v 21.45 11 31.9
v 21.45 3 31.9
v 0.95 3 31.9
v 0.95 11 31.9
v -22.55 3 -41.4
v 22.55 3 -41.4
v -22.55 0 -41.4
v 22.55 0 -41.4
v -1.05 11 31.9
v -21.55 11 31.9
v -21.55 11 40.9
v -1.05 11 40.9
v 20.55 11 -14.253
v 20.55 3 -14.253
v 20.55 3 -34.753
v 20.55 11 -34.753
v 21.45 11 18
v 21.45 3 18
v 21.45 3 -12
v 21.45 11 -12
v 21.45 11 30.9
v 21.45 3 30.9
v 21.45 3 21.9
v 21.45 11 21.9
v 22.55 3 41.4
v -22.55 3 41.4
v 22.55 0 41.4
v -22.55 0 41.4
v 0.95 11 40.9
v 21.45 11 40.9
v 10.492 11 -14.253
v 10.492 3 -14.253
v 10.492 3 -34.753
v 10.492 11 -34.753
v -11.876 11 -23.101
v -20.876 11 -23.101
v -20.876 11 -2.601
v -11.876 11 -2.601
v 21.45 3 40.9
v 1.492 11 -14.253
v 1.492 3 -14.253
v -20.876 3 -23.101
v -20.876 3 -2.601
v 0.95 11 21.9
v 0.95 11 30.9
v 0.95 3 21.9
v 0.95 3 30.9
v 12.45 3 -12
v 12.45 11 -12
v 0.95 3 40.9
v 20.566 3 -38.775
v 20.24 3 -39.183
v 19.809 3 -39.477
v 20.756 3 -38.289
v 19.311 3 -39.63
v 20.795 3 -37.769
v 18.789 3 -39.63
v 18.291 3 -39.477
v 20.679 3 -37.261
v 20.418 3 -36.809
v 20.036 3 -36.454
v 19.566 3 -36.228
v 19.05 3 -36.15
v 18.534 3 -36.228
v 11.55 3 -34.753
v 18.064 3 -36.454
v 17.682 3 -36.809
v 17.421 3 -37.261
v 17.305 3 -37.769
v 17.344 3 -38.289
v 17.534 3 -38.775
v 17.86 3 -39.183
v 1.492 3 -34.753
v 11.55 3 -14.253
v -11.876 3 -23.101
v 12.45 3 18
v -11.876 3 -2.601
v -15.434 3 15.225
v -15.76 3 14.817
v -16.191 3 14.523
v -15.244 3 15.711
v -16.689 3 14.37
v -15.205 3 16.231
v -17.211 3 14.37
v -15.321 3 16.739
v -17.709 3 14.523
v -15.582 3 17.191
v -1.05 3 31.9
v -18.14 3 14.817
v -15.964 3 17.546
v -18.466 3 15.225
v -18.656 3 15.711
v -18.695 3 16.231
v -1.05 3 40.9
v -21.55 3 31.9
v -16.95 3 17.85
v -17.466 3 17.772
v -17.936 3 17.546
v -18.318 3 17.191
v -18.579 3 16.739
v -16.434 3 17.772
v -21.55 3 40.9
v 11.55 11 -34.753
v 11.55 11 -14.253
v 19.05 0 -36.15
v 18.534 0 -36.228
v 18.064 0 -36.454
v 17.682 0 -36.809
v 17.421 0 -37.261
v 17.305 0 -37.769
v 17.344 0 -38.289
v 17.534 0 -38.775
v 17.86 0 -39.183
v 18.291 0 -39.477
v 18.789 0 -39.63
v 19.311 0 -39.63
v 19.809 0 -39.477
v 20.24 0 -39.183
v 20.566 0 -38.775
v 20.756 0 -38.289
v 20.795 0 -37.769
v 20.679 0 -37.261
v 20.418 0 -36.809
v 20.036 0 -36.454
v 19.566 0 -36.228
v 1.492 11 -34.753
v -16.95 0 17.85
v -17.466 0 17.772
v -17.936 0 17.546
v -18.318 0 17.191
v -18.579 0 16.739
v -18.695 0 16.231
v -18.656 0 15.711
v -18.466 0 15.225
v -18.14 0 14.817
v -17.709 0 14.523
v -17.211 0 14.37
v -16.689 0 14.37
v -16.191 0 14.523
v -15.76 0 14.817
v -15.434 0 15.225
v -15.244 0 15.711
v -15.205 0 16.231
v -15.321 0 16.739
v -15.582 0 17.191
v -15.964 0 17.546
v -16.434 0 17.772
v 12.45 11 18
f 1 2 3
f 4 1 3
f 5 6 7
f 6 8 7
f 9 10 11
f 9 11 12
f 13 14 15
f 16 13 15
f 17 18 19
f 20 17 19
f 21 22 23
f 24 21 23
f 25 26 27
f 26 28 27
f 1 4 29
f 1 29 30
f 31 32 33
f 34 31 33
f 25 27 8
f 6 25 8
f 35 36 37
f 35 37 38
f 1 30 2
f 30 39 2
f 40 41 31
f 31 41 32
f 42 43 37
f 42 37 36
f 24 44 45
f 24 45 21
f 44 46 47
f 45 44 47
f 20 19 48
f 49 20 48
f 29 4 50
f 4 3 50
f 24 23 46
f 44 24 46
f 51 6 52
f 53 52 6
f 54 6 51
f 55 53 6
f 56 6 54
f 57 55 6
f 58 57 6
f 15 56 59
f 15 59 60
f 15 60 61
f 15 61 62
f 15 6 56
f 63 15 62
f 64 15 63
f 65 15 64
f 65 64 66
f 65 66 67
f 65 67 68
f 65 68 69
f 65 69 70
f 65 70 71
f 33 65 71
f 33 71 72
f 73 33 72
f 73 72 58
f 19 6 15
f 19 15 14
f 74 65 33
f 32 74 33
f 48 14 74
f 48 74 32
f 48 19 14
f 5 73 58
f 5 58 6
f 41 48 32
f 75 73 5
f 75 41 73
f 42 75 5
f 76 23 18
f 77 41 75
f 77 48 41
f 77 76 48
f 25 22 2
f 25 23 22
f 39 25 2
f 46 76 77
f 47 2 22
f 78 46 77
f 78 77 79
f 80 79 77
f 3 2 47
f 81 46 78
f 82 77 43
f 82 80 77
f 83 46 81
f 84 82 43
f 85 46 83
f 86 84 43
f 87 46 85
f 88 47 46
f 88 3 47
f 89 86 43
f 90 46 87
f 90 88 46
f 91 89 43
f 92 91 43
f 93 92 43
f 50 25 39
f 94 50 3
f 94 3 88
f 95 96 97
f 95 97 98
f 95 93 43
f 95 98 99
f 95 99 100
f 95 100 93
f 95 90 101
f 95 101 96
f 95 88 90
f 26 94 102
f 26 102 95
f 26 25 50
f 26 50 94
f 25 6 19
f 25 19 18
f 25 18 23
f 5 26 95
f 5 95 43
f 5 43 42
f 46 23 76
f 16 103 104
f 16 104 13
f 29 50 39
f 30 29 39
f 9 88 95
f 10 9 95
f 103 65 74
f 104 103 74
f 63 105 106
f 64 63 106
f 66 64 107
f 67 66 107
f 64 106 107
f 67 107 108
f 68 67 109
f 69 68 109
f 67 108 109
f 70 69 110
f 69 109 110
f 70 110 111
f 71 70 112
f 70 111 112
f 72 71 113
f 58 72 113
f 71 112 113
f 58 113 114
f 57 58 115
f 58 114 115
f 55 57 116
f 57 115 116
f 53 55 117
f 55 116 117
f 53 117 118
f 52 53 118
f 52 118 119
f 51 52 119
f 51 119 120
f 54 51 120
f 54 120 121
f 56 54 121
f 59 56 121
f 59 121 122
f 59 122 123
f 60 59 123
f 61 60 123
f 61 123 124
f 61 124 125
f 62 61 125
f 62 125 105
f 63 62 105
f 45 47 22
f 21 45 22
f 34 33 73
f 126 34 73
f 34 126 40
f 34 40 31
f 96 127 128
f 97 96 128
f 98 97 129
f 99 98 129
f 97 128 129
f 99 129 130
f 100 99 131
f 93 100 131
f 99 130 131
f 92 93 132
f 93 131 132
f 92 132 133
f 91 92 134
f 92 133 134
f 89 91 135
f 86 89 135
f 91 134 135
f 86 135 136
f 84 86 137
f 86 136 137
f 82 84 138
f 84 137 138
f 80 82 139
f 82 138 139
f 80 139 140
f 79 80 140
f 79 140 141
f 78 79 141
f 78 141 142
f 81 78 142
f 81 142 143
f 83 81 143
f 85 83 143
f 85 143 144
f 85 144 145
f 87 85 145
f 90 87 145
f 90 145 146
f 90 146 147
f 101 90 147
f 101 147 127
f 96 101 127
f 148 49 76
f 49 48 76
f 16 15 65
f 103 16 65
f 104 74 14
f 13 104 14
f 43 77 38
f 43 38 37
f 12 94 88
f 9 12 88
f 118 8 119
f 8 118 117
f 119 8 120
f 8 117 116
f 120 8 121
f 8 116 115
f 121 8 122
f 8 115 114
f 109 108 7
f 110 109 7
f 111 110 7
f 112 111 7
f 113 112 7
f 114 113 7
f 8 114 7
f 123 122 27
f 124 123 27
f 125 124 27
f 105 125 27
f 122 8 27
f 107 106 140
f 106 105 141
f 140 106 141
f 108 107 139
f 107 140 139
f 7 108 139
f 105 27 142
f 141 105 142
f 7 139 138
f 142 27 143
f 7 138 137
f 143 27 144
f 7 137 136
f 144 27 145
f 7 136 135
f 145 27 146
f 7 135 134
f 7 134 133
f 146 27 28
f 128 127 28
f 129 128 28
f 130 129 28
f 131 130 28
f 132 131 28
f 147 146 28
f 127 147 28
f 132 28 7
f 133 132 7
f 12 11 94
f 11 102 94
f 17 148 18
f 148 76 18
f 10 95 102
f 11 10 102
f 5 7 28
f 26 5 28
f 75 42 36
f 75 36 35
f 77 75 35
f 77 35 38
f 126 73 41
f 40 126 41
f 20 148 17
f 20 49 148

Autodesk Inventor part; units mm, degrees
ref_plane "YZ Plane" through (0, 0, 0) normal (1, 0, 0) x (0, 1, 0)
ref_plane "XZ Plane" through (0, 0, 0) normal (0, 1, 0) x (-1, 0, 0)
ref_plane "XY Plane" through (0, 0, 0) normal (0, 0, 1) x (1, 0, 0)
sketch "Szkic1" plane through (0, 0, 0) normal (0, 1, 0) x (-1, 0, 0)
  line L0 (-22.55, -41.4) -> (22.55, -41.4)
  line L1 (22.55, -41.4) -> (22.55, 41.4)
  line L2 (22.55, 41.4) -> (-22.55, 41.4)
  line L3 (-22.55, 41.4) -> (-22.55, -41.4)
  line L4 (-22.55, -41.4) -> (22.55, 41.4) construction
  line L5 (22.55, -41.4) -> (-22.55, 41.4) construction
  point P0 (0, 0)
  dimension "d0" = 45.1
  dimension "d1" = 82.8
extrude "Wyciągnięcie proste1" add sketch "Szkic1" along normal blind 3
sketch "Szkic2" plane through (0, 3, 0) normal (0, 1, 0) x (1, 0, 0)
  line L0 (22.55, 41.4) -> (-22.55, 41.4) projected
  line L1 (-22.55, 41.4) -> (-22.55, -41.4) projected
  line L2 (-22.55, -41.4) -> (22.55, -41.4) projected
  line L3 (22.55, -41.4) -> (22.55, 41.4) projected
  point P0 (0, 0)
  point P1 (-16.95, -16.1)
  point P2 (19.05, 37.9)
  dimension "d4" = 57.5
  dimension "d5" = 54
  dimension "d6" = 3.5
  dimension "d7" = 36
hole "Otwór1" at (-16.95, 3, 16.1) at (19.05, 3, -37.9) direction (0, -1, 0) diameter 3.5 end through all
sketch "Szkic3" plane through (0, 3, 0) normal (0, 1, 0) x (1, 0, 0)
  circle A0 centre (-16.95, -16.1) radius 1.75 projected
  circle A1 centre (19.05, 37.9) radius 1.75 projected
  line L0 (22.55, 41.4) -> (-22.55, 41.4) projected
  line L1 (-22.55, 41.4) -> (-22.55, -41.4) projected
  line L2 (-22.55, -41.4) -> (22.55, -41.4) projected
  line L3 (22.55, -41.4) -> (22.55, 41.4) projected
  line L4 (-21.55, -40.9) -> (-1.05, -40.9)
  line L5 (-1.05, -40.9) -> (-1.05, -31.9)
  line L6 (-1.05, -31.9) -> (-21.55, -31.9)
  line L7 (-21.55, -31.9) -> (-21.55, -40.9)
  line L8 (0.95, -40.9) -> (21.45, -40.9)
  line L9 (21.45, -40.9) -> (21.45, -31.9)
  line L10 (21.45, -31.9) -> (0.95, -31.9)
  line L11 (0.95, -31.9) -> (0.95, -40.9)
  line L12 (0.95, -30.9) -> (21.45, -30.9)
  line L13 (21.45, -30.9) -> (21.45, -21.9)
  line L14 (21.45, -21.9) -> (0.95, -21.9)
  line L15 (0.95, -21.9) -> (0.95, -30.9)
  line L16 (20.55, 34.7531) -> (11.55, 34.7531)
  line L17 (11.55, 34.7531) -> (11.55, 14.2531)
  line L18 (11.55, 14.2531) -> (20.55, 14.2531)
  line L19 (20.55, 14.2531) -> (20.55, 34.7531)
  line L20 (10.4919, 34.7531) -> (1.4919, 34.7531)
  line L21 (1.4919, 34.7531) -> (1.4919, 14.2531)
  line L22 (1.4919, 14.2531) -> (10.4919, 14.2531)
  line L23 (10.4919, 14.2531) -> (10.4919, 34.7531)
  line L24 (21.45, 12.0004) -> (12.45, 12.0004)
  line L25 (12.45, 12.0004) -> (12.45, -17.9996)
  line L26 (12.45, -17.9996) -> (21.45, -17.9996)
  line L27 (21.45, -17.9996) -> (21.45, 12.0004)
  line L28 (-20.8756, 23.1013) -> (-11.8756, 23.1013)
  line L29 (-11.8756, 23.1013) -> (-11.8756, 2.6013)
  line L30 (-11.8756, 2.6013) -> (-20.8756, 2.6013)
  line L31 (-20.8756, 2.6013) -> (-20.8756, 23.1013)
  point P0 (0, 0)
  dimension "d15" = 20.5
  dimension "d16" = 9
  dimension "d17" = 1
  dimension "d18" = 0.5
  dimension "d19" = 20.5
  dimension "d20" = 9
  dimension "d21" = 2
  dimension "d22" = 0.5
  dimension "d23" = 20.5
  dimension "d24" = 9
  dimension "d25" = 1
  dimension "d26" = 9
  dimension "d27" = 20.5
  dimension "d28" = 9
  dimension "d29" = 20.5
  dimension "d30" = 9
  dimension "d31" = 30
  dimension "d32" = 9
  dimension "d33" = 20.5
extrude "Wyciągnięcie proste2" add sketch "Szkic3" along normal blind 8 contours L7 L6 L5 L4 | L11 L10 L9 L8 | L15 L14 L13 L12 | L19 L18 L17 L16 | L23 L22 L21 L20 | L27 L26 L25 L24 | L28 L29 L30 L31
properties part number "RBC4242"
